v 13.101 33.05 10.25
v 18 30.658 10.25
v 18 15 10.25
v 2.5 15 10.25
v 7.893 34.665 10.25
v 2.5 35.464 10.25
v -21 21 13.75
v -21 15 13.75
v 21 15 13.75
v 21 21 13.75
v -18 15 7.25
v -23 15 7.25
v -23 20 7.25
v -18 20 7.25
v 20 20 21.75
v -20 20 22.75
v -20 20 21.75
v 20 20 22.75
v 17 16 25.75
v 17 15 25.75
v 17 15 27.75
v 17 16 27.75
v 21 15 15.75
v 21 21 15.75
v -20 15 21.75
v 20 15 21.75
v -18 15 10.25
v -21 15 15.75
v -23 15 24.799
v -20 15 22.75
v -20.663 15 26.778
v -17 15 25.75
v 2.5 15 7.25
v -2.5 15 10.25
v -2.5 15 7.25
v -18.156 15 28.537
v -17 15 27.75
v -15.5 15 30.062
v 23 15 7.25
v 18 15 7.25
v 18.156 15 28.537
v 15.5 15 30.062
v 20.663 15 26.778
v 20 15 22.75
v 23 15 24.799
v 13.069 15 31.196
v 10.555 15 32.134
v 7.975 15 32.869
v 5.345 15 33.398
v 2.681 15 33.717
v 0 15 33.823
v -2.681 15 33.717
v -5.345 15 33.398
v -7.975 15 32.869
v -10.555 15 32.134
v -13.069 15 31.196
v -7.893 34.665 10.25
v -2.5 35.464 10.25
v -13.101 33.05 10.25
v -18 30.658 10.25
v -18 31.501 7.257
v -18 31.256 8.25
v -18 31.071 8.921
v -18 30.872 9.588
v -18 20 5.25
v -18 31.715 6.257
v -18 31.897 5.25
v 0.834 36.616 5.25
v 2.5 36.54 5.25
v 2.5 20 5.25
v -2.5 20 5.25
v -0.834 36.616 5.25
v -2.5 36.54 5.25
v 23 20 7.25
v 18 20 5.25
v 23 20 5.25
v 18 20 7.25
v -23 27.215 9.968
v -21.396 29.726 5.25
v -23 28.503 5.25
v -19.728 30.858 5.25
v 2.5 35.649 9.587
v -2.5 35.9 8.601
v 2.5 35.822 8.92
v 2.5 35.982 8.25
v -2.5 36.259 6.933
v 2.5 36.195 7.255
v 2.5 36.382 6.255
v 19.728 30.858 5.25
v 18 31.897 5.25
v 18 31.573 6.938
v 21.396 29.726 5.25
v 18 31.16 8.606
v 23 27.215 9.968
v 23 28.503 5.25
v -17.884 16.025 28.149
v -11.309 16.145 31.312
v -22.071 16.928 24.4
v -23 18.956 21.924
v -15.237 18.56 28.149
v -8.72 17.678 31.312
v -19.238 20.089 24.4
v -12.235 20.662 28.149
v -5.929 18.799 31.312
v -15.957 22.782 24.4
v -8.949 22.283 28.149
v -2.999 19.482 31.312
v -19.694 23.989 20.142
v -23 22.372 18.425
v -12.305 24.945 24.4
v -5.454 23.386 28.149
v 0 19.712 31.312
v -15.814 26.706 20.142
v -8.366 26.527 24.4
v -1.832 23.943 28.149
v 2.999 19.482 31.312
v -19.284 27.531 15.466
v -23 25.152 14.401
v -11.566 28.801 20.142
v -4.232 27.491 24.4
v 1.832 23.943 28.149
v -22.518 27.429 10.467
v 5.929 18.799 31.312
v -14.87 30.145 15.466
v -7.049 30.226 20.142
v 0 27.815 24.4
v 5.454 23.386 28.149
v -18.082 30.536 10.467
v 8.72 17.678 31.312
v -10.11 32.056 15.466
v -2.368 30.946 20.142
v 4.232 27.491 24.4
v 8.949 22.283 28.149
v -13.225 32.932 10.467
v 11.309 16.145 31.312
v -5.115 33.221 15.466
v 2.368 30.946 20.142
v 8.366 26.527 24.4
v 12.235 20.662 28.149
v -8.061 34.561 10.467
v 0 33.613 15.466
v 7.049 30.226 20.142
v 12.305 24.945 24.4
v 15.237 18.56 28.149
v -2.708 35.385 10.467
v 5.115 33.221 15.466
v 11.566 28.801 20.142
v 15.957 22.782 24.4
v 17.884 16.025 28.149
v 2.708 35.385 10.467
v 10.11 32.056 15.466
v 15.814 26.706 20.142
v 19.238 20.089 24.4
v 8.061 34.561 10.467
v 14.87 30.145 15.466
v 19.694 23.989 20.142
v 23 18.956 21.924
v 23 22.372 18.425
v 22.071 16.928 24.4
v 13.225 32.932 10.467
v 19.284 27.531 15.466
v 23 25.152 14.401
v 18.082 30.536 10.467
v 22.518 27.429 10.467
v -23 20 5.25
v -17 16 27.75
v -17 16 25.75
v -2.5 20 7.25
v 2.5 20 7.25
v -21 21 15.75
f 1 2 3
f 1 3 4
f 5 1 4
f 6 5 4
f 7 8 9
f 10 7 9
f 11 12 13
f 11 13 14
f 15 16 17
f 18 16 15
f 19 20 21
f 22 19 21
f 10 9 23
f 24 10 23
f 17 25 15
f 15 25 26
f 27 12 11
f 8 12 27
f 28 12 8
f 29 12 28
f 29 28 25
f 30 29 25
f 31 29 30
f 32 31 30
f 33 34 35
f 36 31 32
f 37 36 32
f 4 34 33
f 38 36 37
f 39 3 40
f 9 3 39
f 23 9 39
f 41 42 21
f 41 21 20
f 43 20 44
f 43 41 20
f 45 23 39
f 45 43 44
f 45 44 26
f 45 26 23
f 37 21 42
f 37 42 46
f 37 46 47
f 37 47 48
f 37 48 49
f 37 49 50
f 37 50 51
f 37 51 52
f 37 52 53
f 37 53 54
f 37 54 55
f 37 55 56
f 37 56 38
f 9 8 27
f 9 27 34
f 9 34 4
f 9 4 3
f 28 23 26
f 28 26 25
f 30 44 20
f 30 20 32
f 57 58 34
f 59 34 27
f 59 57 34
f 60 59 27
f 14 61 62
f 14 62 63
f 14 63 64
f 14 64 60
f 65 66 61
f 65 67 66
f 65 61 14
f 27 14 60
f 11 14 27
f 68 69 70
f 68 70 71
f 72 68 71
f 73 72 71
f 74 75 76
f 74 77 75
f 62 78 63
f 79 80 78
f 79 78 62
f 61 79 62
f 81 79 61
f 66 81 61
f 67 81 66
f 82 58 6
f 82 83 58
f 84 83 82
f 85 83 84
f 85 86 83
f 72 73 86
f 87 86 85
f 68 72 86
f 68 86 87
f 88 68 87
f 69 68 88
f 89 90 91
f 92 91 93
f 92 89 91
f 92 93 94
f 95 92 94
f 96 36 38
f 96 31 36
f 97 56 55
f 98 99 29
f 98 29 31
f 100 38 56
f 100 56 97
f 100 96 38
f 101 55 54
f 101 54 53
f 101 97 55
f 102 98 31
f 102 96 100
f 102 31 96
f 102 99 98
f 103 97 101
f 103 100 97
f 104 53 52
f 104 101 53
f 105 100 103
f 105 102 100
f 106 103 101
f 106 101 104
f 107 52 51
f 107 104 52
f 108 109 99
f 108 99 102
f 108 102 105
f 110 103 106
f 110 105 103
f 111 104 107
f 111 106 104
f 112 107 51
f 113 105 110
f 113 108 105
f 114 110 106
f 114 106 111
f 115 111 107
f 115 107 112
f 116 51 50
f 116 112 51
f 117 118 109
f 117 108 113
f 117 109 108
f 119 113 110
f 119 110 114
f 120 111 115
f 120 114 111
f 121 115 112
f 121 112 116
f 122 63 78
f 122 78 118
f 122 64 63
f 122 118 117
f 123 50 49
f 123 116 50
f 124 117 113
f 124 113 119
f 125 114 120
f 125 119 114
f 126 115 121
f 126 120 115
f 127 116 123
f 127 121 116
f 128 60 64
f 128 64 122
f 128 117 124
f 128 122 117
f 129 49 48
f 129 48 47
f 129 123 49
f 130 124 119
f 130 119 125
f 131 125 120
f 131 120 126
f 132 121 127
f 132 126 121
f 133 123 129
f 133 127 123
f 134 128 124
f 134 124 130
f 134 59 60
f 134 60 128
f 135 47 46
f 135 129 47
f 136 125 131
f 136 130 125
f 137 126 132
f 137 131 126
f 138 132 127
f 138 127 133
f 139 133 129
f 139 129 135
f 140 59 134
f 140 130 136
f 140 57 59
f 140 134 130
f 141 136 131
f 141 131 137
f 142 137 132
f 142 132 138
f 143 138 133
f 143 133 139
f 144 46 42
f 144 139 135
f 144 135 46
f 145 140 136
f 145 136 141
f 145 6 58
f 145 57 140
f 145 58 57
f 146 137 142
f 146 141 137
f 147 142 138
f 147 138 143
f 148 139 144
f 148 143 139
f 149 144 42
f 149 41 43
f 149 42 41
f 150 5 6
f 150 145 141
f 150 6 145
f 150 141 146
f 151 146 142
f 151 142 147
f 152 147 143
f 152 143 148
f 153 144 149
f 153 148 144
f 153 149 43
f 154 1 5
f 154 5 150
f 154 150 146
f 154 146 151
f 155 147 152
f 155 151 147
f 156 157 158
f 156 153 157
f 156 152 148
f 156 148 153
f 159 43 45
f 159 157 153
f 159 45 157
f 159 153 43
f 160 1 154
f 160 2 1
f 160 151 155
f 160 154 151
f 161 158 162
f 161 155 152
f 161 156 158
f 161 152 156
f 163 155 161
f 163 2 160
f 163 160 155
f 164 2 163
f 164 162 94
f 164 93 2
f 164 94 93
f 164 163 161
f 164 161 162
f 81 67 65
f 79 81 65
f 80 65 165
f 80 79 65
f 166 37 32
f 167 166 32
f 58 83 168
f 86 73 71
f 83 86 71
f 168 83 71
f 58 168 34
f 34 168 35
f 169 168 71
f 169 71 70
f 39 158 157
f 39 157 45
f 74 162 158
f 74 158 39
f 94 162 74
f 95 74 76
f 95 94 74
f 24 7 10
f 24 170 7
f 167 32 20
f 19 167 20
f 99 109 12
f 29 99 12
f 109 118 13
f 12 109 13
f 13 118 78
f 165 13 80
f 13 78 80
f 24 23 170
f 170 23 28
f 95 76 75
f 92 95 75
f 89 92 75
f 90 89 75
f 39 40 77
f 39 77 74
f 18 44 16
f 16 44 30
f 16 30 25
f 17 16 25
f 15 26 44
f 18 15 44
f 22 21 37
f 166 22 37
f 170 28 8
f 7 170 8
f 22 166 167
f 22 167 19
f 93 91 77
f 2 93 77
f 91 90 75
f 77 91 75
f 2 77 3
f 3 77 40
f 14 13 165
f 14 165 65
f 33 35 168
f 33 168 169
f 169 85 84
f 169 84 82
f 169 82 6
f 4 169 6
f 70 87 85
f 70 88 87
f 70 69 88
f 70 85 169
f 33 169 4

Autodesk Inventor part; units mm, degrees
sketch "スケッチ1" plane through (0, 0, 0) normal (0, 1, 0) x (-1, 0, 0)
  circle A0 centre (0, 0) radius 37
  line L0 (0, 0) -> (0, -37)
  line L1 (0, 0) -> (0, 37)
  dimension "d0" = 74
revolve "回転1" add sketch "スケッチ1" angle 180 about axis through (0, 0, 0) along (0, 0, 1) picked at (-2.7444, -24.3574) contours L1 L0 A0
sketch "スケッチ5" plane through (0, 0, 0) normal (0, -1, 0) x (1, 0, 0)
  line L0 (-20, -25) -> (20, -25)
  line L1 (20, -25) -> (20, -15)
  line L2 (20, -15) -> (-20, -15)
  line L3 (-20, -15) -> (-20, -25)
  line L4 (-20, -17) -> (-20, -15)
  line L5 (0, 27.75) -> (-17, 27.75)
  line L6 (-17, 27.75) -> (-17, 25.75)
  line L7 (-17, 25.75) -> (0, 25.75)
  line L8 (0, 25.75) -> (0, 27.75)
  line L9 (0, 22.75) -> (-20, 22.75)
  line L10 (-20, 22.75) -> (-20, 21.75)
  line L11 (-20, 21.75) -> (0, 21.75)
  line L12 (0, 21.75) -> (0, 22.75)
  line L13 (0, 15.75) -> (-21, 15.75)
  line L14 (-21, 15.75) -> (-21, 13.75)
  line L15 (-21, 13.75) -> (0, 13.75)
  line L16 (0, 13.75) -> (0, 15.75)
  line L17 (0, 7.75) -> (-23, 7.75)
  line L18 (-23, 7.75) -> (-23, 5.25)
  line L19 (-23, 5.25) -> (0, 5.25)
  line L20 (0, 5.25) -> (0, 7.75)
  circle A0 centre (0, 0) radius 37 projected
  circle A1 centre (0, 0) radius 37 projected
  line L21 (0, 37) -> (0, -37)
  line L22 (37, 0) -> (-37, 0)
  line L23 (-32.5, 5.25) -> (-23, 5.25)
  line L24 (-23, 5.25) -> (-23, -5.25)
  line L25 (-23, -5.25) -> (-32.5, -5.25)
  line L26 (-32.5, -5.25) -> (-32.5, 5.25)
  line L27 (-23, -8.0262) -> (-23, 5.25)
  line L28 (-27, 25.2982) -> (-27, -25.2982)
  line L29 (-15.5, 27.75) -> (-12, 27.75)
  line L30 (-12, 27.75) -> (-12, 35)
  line L31 (-12, 35) -> (-15.5, 35)
  line L32 (-15.5, 35) -> (-15.5, 27.75)
  line L33 (-15.5, 25.75) -> (0, 25.75)
  line L34 (0, 25.75) -> (0, 22.75)
  line L35 (0, 22.75) -> (-15.5, 22.75)
  line L36 (-15.5, 22.75) -> (-15.5, 25.75)
  line L37 (-19, 15.75) -> (0, 15.75)
  line L38 (0, 15.75) -> (0, 21.75)
  line L39 (0, 21.75) -> (-19, 21.75)
  line L40 (-19, 21.75) -> (-19, 15.75)
  line L41 (-19, 13.75) -> (0, 13.75)
  line L42 (0, 13.75) -> (0, 7.75)
  line L43 (0, 7.75) -> (-19, 7.75)
  line L44 (-19, 7.75) -> (-19, 13.75)
  line L45 (-23, 0) -> (-40.624, 0)
  line L46 (-23, 0) -> (-8.7712, 0)
  line L47 (-9.875, 5.25) -> (-23, 5.25)
  line L48 (-23, 5.25) -> (-23, -5.25)
  line L49 (-23, -5.25) -> (-9.875, -5.25)
  line L50 (-9.875, 5.25) -> (-23, -5.25) construction
  line L51 (-23, 5.25) -> (-9.875, -5.25) construction
  line L52 (-23, 7.25) -> (-33.5, 7.25)
  line L53 (-33.5, 7.25) -> (-33.5, -7.25)
  line L54 (-33.5, -7.25) -> (-23, -7.25)
  line L55 (-23, -7.25) -> (-23, 7.25)
  line L56 (-23, 7.25) -> (-33.5, -7.25) construction
  line L57 (-33.5, 7.25) -> (-23, -7.25) construction
  line L58 (-6.125, 5.25) -> (0, 5.25)
  line L59 (0, 5.25) -> (0, -5.25)
  line L60 (0, -5.25) -> (-6.125, -5.25)
  line L61 (-6.125, 5.25) -> (0, -5.25) construction
  line L62 (0, 5.25) -> (-6.125, -5.25) construction
  line L63 (-23, 5.25) -> (-27, 5.25)
  line L64 (-23, -5.25) -> (-27, -5.25)
  line L65 (-23, 7.25) -> (-27, 7.25)
  line L66 (-23, -7.25) -> (-27, -7.25)
  line L67 (26.3249, -26) -> (-26.3249, -26)
  line L68 (-6.125, 5.25) -> (-6.8, 5.25)
  line L69 (-6.2297, -5.25) -> (-6.125, -5.25)
  line L70 (-6.125, -5.25) -> (-6.125, 5.25)
  line L71 (-3, 7.75) -> (0, 7.75)
  line L72 (0, 22.75) -> (-4, 22.75)
  line L73 (-4, 21.75) -> (0, 21.75)
  line L74 (0, 21.75) -> (0, 22.75)
  line L75 (-6, 7.75) -> (-1, 7.75)
  line L76 (0, 5.25) -> (-6, 5.25)
  point P0 (0, -25)
  point P1 (0, -15)
  point P2 (0, 26.75)
  point P3 (0, 22.25)
  point P4 (0, 14.75)
  point P5 (0, 6.5)
  point P6 (-20, -20)
  point P7 (-27, -0.5262)
  point P8 (-27, -5.25)
  point P9 (-15.5, 24.25)
  point P10 (-15.5, 33.5969)
  point P11 (0, 27.75)
  point P12 (0, 37)
  point P13 (0, 25.75)
  point P14 (0, 13.75)
  point P15 (0, 15.75)
  point P16 (-27, 0)
  point P17 (-32.5, 0)
  point P18 (-23, 0)
  point P19 (-16.4375, 0)
  point P20 (-28.25, 0)
  point P21 (-3.0625, 0)
  point P22 (-27, 0.5)
  point P23 (-28, 0.4738)
  point P24 (-28, -11.5262)
  point P25 (-27, -11.5)
  point P26 (-23, -5.25)
  point P27 (-23, 5.25)
  point P28 (-23, -5.25)
  point P29 (0, 0)
  point P30 (-8, 6)
  point P31 (-26.3249, -26)
  point P32 (-8, -6)
  point P33 (0, 21.75)
  point P34 (0, 22.75)
  point P35 (-27, -7.25)
  point P36 (-27, 7.25)
  point P37 (-19, 10.75)
  dimension "d12" = 40
  dimension "d13" = 10
  dimension "d23" = 17
  dimension "d24" = 2
  dimension "d27" = 20
  dimension "d28" = 1
  dimension "d30" = 21
  dimension "d31" = 2
  dimension "d33" = 2.5
  dimension "d88" = 0
  dimension "d89" = 0
  dimension "d90" = 12
  dimension "d92" = 20
  dimension "d97" = 9.5
  dimension "d98" = 10.5
  dimension "d113" = 27
  dimension "d122" = 15.5
  dimension "d124" = 3
  dimension "d125" = 15.5
  dimension "d126" = 6
  dimension "d127" = 6
  dimension "d147" = 10.5
  dimension "d161" = 14.5
  dimension "d162" = 10.5
  dimension "d164" = 10.5
  dimension "d170" = 26
  dimension "d207" = 0
  dimension "d283" = 2
  dimension "d284" = 2
  dimension "d297" = 23
extrude "GNSボード" cut sketch "スケッチ5" against normal blind 16 contours L8 L7 L6 L5
extrude "GNSボード止めるよう" cut sketch "スケッチ5" against normal blind 15 contours L21 L5 L30 A0 | L30 L5 L32 A0 | L21 L9 L36 L7
extrude "アルミ板１" cut sketch "スケッチ5" against normal blind 20 contours L12 L11 L10 L9
extrude "メイン基板" cut sketch "スケッチ5" against normal blind 21 contours L15 L14 L13 L16
extrude "メイン止めるよう" cut sketch "スケッチ5" against normal blind 14.5 contours L17 L44 L15 L21 | L13 L40 L11 L21
extrude "アルミ板２" cut sketch "スケッチ5" against normal blind 20 contours L19 L18 L17 L20
extrude "電池ボックス入れ" cut sketch "スケッチ5" against normal blind 13 contours L3 L2 L21 L0 | L21 L2 L1 L0
extrude "side ut" cut sketch "スケッチ5" against normal blind 100 contours A0 L22 L53 L54 L28 | A0 L28 L52 L53 L22 | L54 L53 L22 L26 L25 L28 | L53 L52 L28 L23 L26 L22 | L25 L26 L22 L28 | L26 L23 L28 L22
extrude "motor case" add sketch "スケッチ5" against normal blind 7 contours L54 L53 L22 L26 L25 L28 | L28 L25 L27 L54 | L53 L52 L28 L23 L26 L22 | L28 L22 L24 L25 | L25 L26 L22 L28 | L22 L28 L23 L24 | L52 L18 L23 L28 | L26 L23 L28 L22
extrude "bottom cut" cut sketch "スケッチ5" against normal blind 90 contours L67 A0 L21 | L21 A0 L67
extrude "motor" [suppressed]
extrude "motor block" [suppressed]
sketch "スケッチ27" plane through (-33.5, 0, -7.25) normal (-1, 0, 0) x (0, 0, 1)
  line L0 (14.5, 0) -> (0, 0) projected
  circle A0 centre (7.25, 0) radius 3
  point P0 (7.25, 0)
  dimension "d198" = 6
extrude "押し出し36" cut sketch "スケッチ27" against normal blind 27
mirror "ミラー13" about plane through (0, 0, 0) normal (1, 0, 0) of "メイン止めるよう", "メイン基板", "アルミ板１", "GNSボード止めるよう", "GNSボード", "アルミ板２", "motor case", "押し出し36", "電池ボックス入れ", "side ut"
ref_plane "作業平面5" through (-17, 17.5, 25.75) normal (0, -1, 0) x (1, 0, 0)
ref_plane "作業平面6" through (20, 13, -15) normal (0, 0, -1) x (1, 0, 0)
sketch "スケッチ38" plane through (20, 13, -15) normal (0, 0, -1) x (1, 0, 0)
  line L0 (-40, 13) -> (0, 13) projected
  line L1 (-40, 13) -> (-40, 0) projected
  line L2 (-40, 0) -> (0, 0) projected
  line L3 (0, 13) -> (0, 0) projected
  line L4 (-38, 6) -> (-28, 6)
  line L5 (-28, 6) -> (-28, -3)
  line L6 (-28, -3) -> (-38, -3)
  line L7 (-38, -3) -> (-38, 6)
  point P0 (-20, 13)
  dimension "d235" = 3
  dimension "d236" = 9
  dimension "d237" = 10
  dimension "d238" = 2
extrude "押し出し44" cut sketch "スケッチ38" against normal blind 18 contours L7 L4 L5 L2 | L2 L5 L6 L7
ref_plane "作業平面7" through (27, 35, 7.25) normal (0, -1, 0) x (1, 0, 0)
sketch "スケッチ41" plane through (-17, 0, 25.75) normal (0, -1, 0) x (1, 0, 0)
  line L0 (-16.5, -22.75) -> (10.5, -22.75) projected
  line L1 (-6, -20.5) -> (-6, -18) projected
  line L2 (-6, -18) -> (-2, -18) projected
  line L3 (-2, -18) -> (-2, -12) projected
  line L4 (-2, -12) -> (-4, -12) projected
  line L5 (-4, -12) -> (-4, -10) projected
  line L6 (-4, -10) -> (-2, -10) projected
  line L7 (-2, -10) -> (-2, -4) projected
  line L8 (-2, -4) -> (-3, -4) projected
  line L9 (-3, -4) -> (-3, -3) projected
  line L10 (-3, -3) -> (1.5, -3) projected
  line L11 (1.5, -3) -> (1.5, 0) projected
  line L12 (1.5, 0) -> (0, 0) projected
  line L13 (0, 0) -> (0, 2) projected
  line L14 (0, 2) -> (1.5, 2) projected
  line L15 (1.5, 2) -> (1.5, 7.8469) projected
  arc A0 (1.5, 7.8469) -> (-10, -0.4518) centre (17, -25.75) ccw projected
  line L16 (-10, -0.4518) -> (-10, -18.5) projected
  line L17 (-10, -18.5) -> (-16.5, -18.5) projected
  line L18 (-16.5, -18.5) -> (-16.5, -22.75) projected
  line L19 (-2, -18) -> (-2, -12) projected
  line L20 (-4, -10) -> (-4, -12) projected
  line L21 (0, 2) -> (0, 0) projected
  circle A1 centre (-4, 0) radius 2
  line L22 (50.5, -28.75) -> (23.5, -28.75) projected
  line L23 (23.5, -28.75) -> (23.5, -22.75) projected
  line L24 (23.5, -22.75) -> (50.5, -22.75) projected
  line L25 (50.5, -18.5) -> (50.5, -22.75) projected
  line L26 (44, -18.5) -> (50.5, -18.5) projected
  line L27 (44, -18.5) -> (44, -0.4518) projected
  arc A2 (44, -0.4518) -> (32.5, 7.8469) centre (17, -25.75) ccw projected
  line L28 (32.5, 7.8469) -> (32.5, 2) projected
  line L29 (32.5, 2) -> (34, 2) projected
  line L30 (34, 2) -> (34, 0) projected
  line L31 (34, 0) -> (32.5, 0) projected
  line L32 (32.5, 0) -> (32.5, -3) projected
  line L33 (32.5, -3) -> (37, -3) projected
  line L34 (37, -3) -> (37, -4) projected
  line L35 (37, -4) -> (36, -4) projected
  line L36 (36, -4) -> (36, -10) projected
  line L37 (36, -10) -> (38, -10) projected
  line L38 (38, -10) -> (38, -12) projected
  line L39 (38, -12) -> (36, -12) projected
  line L40 (36, -12) -> (36, -18) projected
  line L41 (36, -18) -> (40, -18) projected
  line L42 (40, -18) -> (40, -20.5) projected
  line L43 (40, -20.5) -> (-6, -20.5) projected
  line L44 (10.5, -22.75) -> (10.5, -28.75) projected
  line L45 (10.5, -28.75) -> (-16.5, -28.75) projected
  line L46 (-16.5, -28.75) -> (-16.5, -33) projected
  line L47 (-16.5, -33) -> (-10, -33) projected
  line L48 (-10, -33) -> (-10, -51.0482) projected
  arc A3 (-10, -51.0482) -> (-9.3249, -51.75) centre (17, -25.75) ccw projected
  line L49 (-9.3249, -51.75) -> (43.3249, -51.75) projected
  arc A4 (43.3249, -51.75) -> (44, -51.0482) centre (17, -25.75) ccw projected
  line L50 (44, -51.0482) -> (44, -33) projected
  line L51 (50.5, -33) -> (44, -33) projected
  line L52 (50.5, -28.75) -> (50.5, -33) projected
  dimension "d252" = 4
  dimension "d253" = 4
  dimension "d254" = 3
extrude "押し出し46" cut sketch "スケッチ41" against normal blind 10 contours A1
mirror "ミラー15" about plane through (0, 0, 0) normal (1, 0, 0) of "押し出し46"
sketch "スケッチ42" plane through (-33.5, 0, -7.25) normal (0, -1, 0) x (1, 0, 0)
  circle A0 centre (10, -8) radius 2
  line L0 (13.5, -17.75) -> (13.5, -7.75) projected
  line L1 (10, 2) -> (1, 2) projected
  point P0 (33.5, 7.25)
  dimension "d257" = 3.5
  dimension "d258" = 4
  dimension "d259" = 10
extrude "押し出し47" cut sketch "スケッチ42" against normal blind 10
mirror "ミラー16" about plane through (0, 0, 0) normal (1, 0, 0) of "押し出し47"
ref_plane "作業平面8" through (-17, 15, 25.75) normal (0, -1, 0) x (1, 0, 0)
sketch "スケッチ45" plane through (-17, 15, 25.75) normal (0, -1, 0) x (1, 0, 0)
  circle A0 centre (-4, 0) radius 2 projected
  line L0 (-16.5, -22.75) -> (10.5, -22.75) projected
  line L1 (-6, -20.5) -> (-6, -18) projected
  line L2 (-6, -18) -> (-2, -18) projected
  line L3 (-2, -18) -> (-2, -12) projected
  line L4 (-2, -12) -> (-4, -12) projected
  line L5 (-4, -12) -> (-4, -10) projected
  line L6 (-4, -10) -> (-2, -10) projected
  line L7 (-2, -10) -> (-2, -4) projected
  line L8 (-2, -4) -> (-3, -4) projected
  line L9 (-3, -4) -> (-3, -3) projected
  line L10 (-3, -3) -> (1.5, -3) projected
  line L11 (1.5, -3) -> (1.5, 0) projected
  line L12 (1.5, 0) -> (0, 0) projected
  line L13 (0, 0) -> (0, 2) projected
  line L14 (0, 2) -> (1.5, 2) projected
  line L15 (1.5, 2) -> (1.5, 7.8469) projected
  arc A1 (1.5, 7.8469) -> (-10, -0.4518) centre (17, -25.75) ccw projected
  line L16 (-10, -0.4518) -> (-10, -18.5) projected
  line L17 (-10, -18.5) -> (-16.5, -18.5) projected
  line L18 (-16.5, -18.5) -> (-16.5, -22.75) projected
  arc A2 (32.5, 4.3124) -> (1.5, 4.3124) centre (17, -25.75) ccw projected
  line L19 (1.5, 2) -> (1.5, 4.3124) projected
  line L20 (32.5, 2) -> (1.5, 2) projected
  line L21 (32.5, 2) -> (32.5, 4.3124) projected
  circle A3 centre (38, 0) radius 2 projected
  circle A4 centre (38, 0) radius 2 projected
  line L22 (23.5, -22.75) -> (50.5, -22.75) projected
  line L23 (50.5, -18.5) -> (50.5, -22.75) projected
  line L24 (44, -18.5) -> (50.5, -18.5) projected
  line L25 (44, -18.5) -> (44, -0.4518) projected
  arc A5 (44, -0.4518) -> (32.5, 7.8469) centre (17, -25.75) ccw projected
  line L26 (32.5, 7.8469) -> (32.5, 2) projected
  line L27 (32.5, 2) -> (34, 2) projected
  line L28 (34, 2) -> (34, 0) projected
  line L29 (34, 0) -> (32.5, 0) projected
  line L30 (32.5, 0) -> (32.5, -3) projected
  line L31 (32.5, -3) -> (37, -3) projected
  line L32 (37, -3) -> (37, -4) projected
  line L33 (37, -4) -> (36, -4) projected
  line L34 (36, -4) -> (36, -10) projected
  line L35 (36, -10) -> (38, -10) projected
  line L36 (38, -10) -> (38, -12) projected
  line L37 (38, -12) -> (36, -12) projected
  line L38 (36, -12) -> (36, -18) projected
  line L39 (36, -18) -> (40, -18) projected
  line L40 (40, -18) -> (40, -20.5) projected
  circle A6 centre (-4, 0) radius 2 projected
  line L41 (1.5, 0) -> (32.5, 0) projected
  line L42 (32.5, -3) -> (1.5, -3) projected
  line L43 (32.5, -3) -> (32.5, 0) projected
  line L44 (1.5, 0) -> (32.5, 0) projected
  line L45 (1.5, -3) -> (1.5, 0) projected
  line L46 (34, 0) -> (0, 0) projected
  line L47 (34, 0) -> (34, 2) projected
  line L48 (34, 2) -> (0, 2) projected
  line L49 (0, 0) -> (0, 2) projected
  line L50 (36, -10) -> (-2, -10) projected
  line L51 (36, -10) -> (36, -4) projected
  line L52 (-2, -4) -> (36, -4) projected
  line L53 (-2, -10) -> (-2, -4) projected
  line L54 (38, -12) -> (-4, -12) projected
  line L55 (38, -12) -> (38, -10) projected
  line L56 (38, -10) -> (-4, -10) projected
  line L57 (-4, -12) -> (-4, -10) projected
  line L58 (36, -18) -> (-2, -18) projected
  line L59 (36, -18) -> (36, -12) projected
  line L60 (-2, -12) -> (36, -12) projected
  line L61 (-2, -18) -> (-2, -12) projected
  line L62 (40, -20.5) -> (-6, -20.5) projected
  line L63 (40, -20.5) -> (40, -18) projected
  line L64 (40, -18) -> (-6, -18) projected
  line L65 (-6, -20.5) -> (-6, -18) projected
  circle A7 centre (40.5, -41) radius 2 projected
  circle A8 centre (-6.5, -41) radius 2 projected
  line L66 (50.5, -28.75) -> (23.5, -28.75) projected
  line L67 (40, -20.5) -> (-6, -20.5) projected
  line L68 (10.5, -28.75) -> (-16.5, -28.75) projected
  line L69 (-6, -20.5) -> (-6, -18) projected
  line L70 (-16.5, -28.75) -> (-16.5, -33) projected
  line L71 (-16.5, -33) -> (-10, -33) projected
  line L72 (-10, -33) -> (-10, -51.0482) projected
  arc A9 (-10, -51.0482) -> (-9.3249, -51.75) centre (17, -25.75) ccw projected
  line L73 (-9.3249, -51.75) -> (43.3249, -51.75) projected
  arc A10 (43.3249, -51.75) -> (44, -51.0482) centre (17, -25.75) ccw projected
  line L74 (44, -51.0482) -> (44, -33) projected
  line L75 (50.5, -33) -> (44, -33) projected
  line L76 (50.5, -28.75) -> (50.5, -33) projected
  line L77 (40, -18) -> (40, -20.5) projected
  line L78 (-3, -40.75) -> (37, -40.75) projected
  line L79 (37, -40.75) -> (37, -50.75) projected
  line L80 (37, -50.75) -> (-3, -50.75) projected
  line L81 (-3, -50.75) -> (-3, -40.75) projected
  line L82 (-6, -18) -> (40, -18)
  line L83 (40, -18) -> (40, 8.0731)
  line L84 (40, 8.0731) -> (-6, 8.0731)
  line L85 (-6, 8.0731) -> (-6, -18)
  arc A11 (32.5, 4.3124) -> (1.5, 4.3124) centre (17, -25.75) ccw projected
  line L86 (32.5, 4.3124) -> (32.5, 7.8469) projected
  arc A12 (44, -0.4518) -> (32.5, 7.8469) centre (17, -25.75) ccw projected
  line L87 (44, -0.4518) -> (44, -51.0482) projected
  arc A13 (43.3249, -51.75) -> (44, -51.0482) centre (17, -25.75) ccw projected
  line L88 (43.3249, -51.75) -> (-9.3249, -51.75) projected
  arc A14 (-10, -51.0482) -> (-9.3249, -51.75) centre (17, -25.75) ccw projected
  line L89 (-10, -51.0482) -> (-10, -0.4518) projected
  arc A15 (1.5, 7.8469) -> (-10, -0.4518) centre (17, -25.75) ccw projected
  line L90 (1.5, 7.8469) -> (1.5, 4.3124) projected
  line L91 (9, -32) -> (9, -20) projected
  line L92 (-6, -20) -> (9, -20) projected
  line L93 (-6, -21) -> (-6, -20) projected
  line L94 (-15, -21) -> (-6, -21) projected
  line L95 (-15, -31) -> (-15, -21) projected
  line L96 (-6, -31) -> (-15, -31) projected
  line L97 (-6, -32) -> (-6, -31) projected
  line L98 (9, -32) -> (-6, -32) projected
  line L99 (50.5, -28.75) -> (23.5, -28.75) projected
  line L100 (50.5, -22.75) -> (50.5, -28.75) projected
  line L101 (23.5, -22.75) -> (50.5, -22.75) projected
  line L102 (-16.5, -22.75) -> (10.5, -22.75) projected
  line L103 (-16.5, -28.75) -> (-16.5, -22.75) projected
  line L104 (10.5, -28.75) -> (-16.5, -28.75) projected
  line L105 (10.5, -28.75) -> (10.5, -22.75) projected
  line L106 (23.5, -28.75) -> (23.5, -22.75) projected
  line L107 (50.5, -28.75) -> (23.5, -28.75) projected
  line L108 (23.5, -28.75) -> (23.5, -22.75) projected
  line L109 (40, -20.5) -> (-6, -20.5) projected
  line L110 (-6, -20.5) -> (-6, -18) projected
  line L111 (-6, -18) -> (-2, -18) projected
  line L112 (-2, -18) -> (-2, -12) projected
  line L113 (-2, -12) -> (-4, -12) projected
  line L114 (-4, -12) -> (-4, -10) projected
  line L115 (-4, -10) -> (-2, -10) projected
  line L116 (-2, -10) -> (-2, -4) projected
  line L117 (-2, -4) -> (-3, -4) projected
  line L118 (-3, -4) -> (-3, -3) projected
  line L119 (-3, -3) -> (1.5, -3) projected
  line L120 (1.5, -3) -> (1.5, 0) projected
  line L121 (1.5, 0) -> (0, 0) projected
  line L122 (0, 0) -> (0, 2) projected
  line L123 (0, 2) -> (1.5, 2) projected
  line L124 (1.5, 2) -> (1.5, 7.8469) projected
  arc A16 (1.5, 7.8469) -> (-10, -0.4518) centre (17, -25.75) ccw projected
  line L125 (-10, -0.4518) -> (-10, -18.5) projected
  line L126 (-10, -18.5) -> (-16.5, -18.5) projected
  line L127 (-16.5, -18.5) -> (-16.5, -22.75) projected
  line L128 (-16.5, -22.75) -> (10.5, -22.75) projected
  line L129 (10.5, -22.75) -> (10.5, -28.75) projected
  line L130 (10.5, -28.75) -> (-16.5, -28.75) projected
  line L131 (-16.5, -28.75) -> (-16.5, -33) projected
  line L132 (-16.5, -33) -> (-10, -33) projected
  line L133 (-10, -33) -> (-10, -51.0482) projected
  arc A17 (-10, -51.0482) -> (-9.3249, -51.75) centre (17, -25.75) ccw projected
  line L134 (-9.3249, -51.75) -> (43.3249, -51.75) projected
  arc A18 (43.3249, -51.75) -> (44, -51.0482) centre (17, -25.75) ccw projected
  line L135 (44, -51.0482) -> (44, -33) projected
  line L136 (50.5, -33) -> (44, -33) projected
  line L137 (50.5, -28.75) -> (50.5, -33) projected
  line L138 (50.5, -28.75) -> (23.5, -28.75) projected
  line L139 (23.5, -28.75) -> (23.5, -22.75) projected
  line L140 (23.5, -22.75) -> (50.5, -22.75) projected
  line L141 (50.5, -18.5) -> (50.5, -22.75) projected
  line L142 (44, -18.5) -> (50.5, -18.5) projected
  line L143 (44, -18.5) -> (44, -0.4518) projected
  arc A19 (44, -0.4518) -> (32.5, 7.8469) centre (17, -25.75) ccw projected
  line L144 (32.5, 7.8469) -> (32.5, 2) projected
  line L145 (32.5, 2) -> (34, 2) projected
  line L146 (34, 2) -> (34, 0) projected
  line L147 (34, 0) -> (32.5, 0) projected
  line L148 (32.5, 0) -> (32.5, -3) projected
  line L149 (32.5, -3) -> (37, -3) projected
  line L150 (37, -3) -> (37, -4) projected
  line L151 (37, -4) -> (36, -4) projected
  line L152 (36, -4) -> (36, -10) projected
  line L153 (36, -10) -> (38, -10) projected
  line L154 (38, -10) -> (38, -12) projected
  line L155 (38, -12) -> (36, -12) projected
  line L156 (36, -12) -> (36, -18) projected
  line L157 (36, -18) -> (40, -18) projected
  line L158 (40, -18) -> (40, -20.5) projected
  line L159 (40, -20.5) -> (-6, -20.5) projected
  line L160 (10.5, -22.75) -> (10.5, -28.75) projected
  line L161 (10.5, -28.75) -> (-16.5, -28.75) projected
  line L162 (-16.5, -28.75) -> (-16.5, -33) projected
  line L163 (-16.5, -33) -> (-10, -33) projected
  line L164 (-10, -33) -> (-10, -51.0482) projected
  arc A20 (-10, -51.0482) -> (-9.3249, -51.75) centre (17, -25.75) ccw projected
  line L165 (-9.3249, -51.75) -> (43.3249, -51.75) projected
  arc A21 (43.3249, -51.75) -> (44, -51.0482) centre (17, -25.75) ccw projected
  line L166 (44, -51.0482) -> (44, -33) projected
  line L167 (50.5, -33) -> (44, -33) projected
  line L168 (50.5, -28.75) -> (50.5, -33) projected
  line L169 (23.5, -28.75) -> (23.5, -22.75) projected
  line L170 (23.5, -22.75) -> (50.5, -22.75) projected
  line L171 (50.5, -18.5) -> (50.5, -22.75) projected
  line L172 (44, -18.5) -> (50.5, -18.5) projected
  line L173 (44, -18.5) -> (44, -0.4518) projected
  arc A22 (44, -0.4518) -> (32.5, 7.8469) centre (17, -25.75) ccw projected
  line L174 (32.5, 7.8469) -> (32.5, 2) projected
  line L175 (32.5, 2) -> (34, 2) projected
  line L176 (34, 2) -> (34, 0) projected
  line L177 (34, 0) -> (32.5, 0) projected
  line L178 (32.5, 0) -> (32.5, -3) projected
  line L179 (32.5, -3) -> (37, -3) projected
  line L180 (37, -3) -> (37, -4) projected
  line L181 (37, -4) -> (36, -4) projected
  line L182 (36, -4) -> (36, -10) projected
  line L183 (36, -10) -> (38, -10) projected
  line L184 (38, -10) -> (38, -12) projected
  line L185 (38, -12) -> (36, -12) projected
  line L186 (36, -12) -> (36, -18) projected
  line L187 (36, -18) -> (40, -18) projected
  line L188 (-6, -18) -> (-2, -18) projected
  line L189 (-2, -18) -> (-2, -12) projected
  line L190 (-2, -12) -> (-4, -12) projected
  line L191 (-4, -12) -> (-4, -10) projected
  line L192 (-4, -10) -> (-2, -10) projected
  line L193 (-2, -10) -> (-2, -4) projected
  line L194 (-2, -4) -> (-3, -4) projected
  line L195 (-3, -4) -> (-3, -3) projected
  line L196 (-3, -3) -> (1.5, -3) projected
  line L197 (1.5, -3) -> (1.5, 0) projected
  line L198 (1.5, 0) -> (0, 0) projected
  line L199 (0, 0) -> (0, 2) projected
  line L200 (0, 2) -> (1.5, 2) projected
  line L201 (1.5, 2) -> (1.5, 7.8469) projected
  arc A23 (1.5, 7.8469) -> (-10, -0.4518) centre (17, -25.75) ccw projected
  line L202 (-10, -0.4518) -> (-10, -18.5) projected
  line L203 (-10, -18.5) -> (-16.5, -18.5) projected
  line L204 (-16.5, -18.5) -> (-16.5, -22.75) projected
  line L205 (-16.5, -22.75) -> (10.5, -22.75) projected
  line L206 (10.5, -22.75) -> (10.5, -28.75) projected
  point P0 (-10, -33)
  point P1 (44, -33)
  point P2 (44, -18.5)
  point P3 (40, 3.2328)
  point P4 (40, -18)
  point P5 (-6, -20.5)
  point P6 (-6, -18)
  point P7 (-6, 3.2328)
  point P8 (-10, -33)
  point P9 (44, -33)
  point P10 (44, -18.5)
  point P11 (-10, -18.5)
  point P12 (44, -22.75)
  point P13 (-10, -22.75)
  point P14 (-10, -18.5)
  point P15 (44, -28.75)
  point P16 (-10, -28.75)
  point P17 (32.5, 4.3124)
  point P18 (1.5, 4.3124)
  point P19 (1.5, 4.3124)
  point P20 (32.5, 4.3124)
  point P21 (-10, -22.75)
  point P22 (-10, -28.75)
  point P23 (32.5, 4.3124)
  point P24 (1.5, 4.3124)
  point P25 (44, -22.75)
  point P26 (44, -28.75)
  point P27 (-10, -18.5)
  point P28 (50.5, -28.75)
  point P29 (44, -33)
  point P30 (1.5, 4.3124)
  point P31 (32.5, 4.3124)
  point P32 (50.5, -28.75)
  point P33 (44, -28.75)
  point P34 (44, -22.75)
  point P35 (32.5, 4.3124)
  point P36 (1.5, 4.3124)
  point P37 (44, -33)
  point P38 (-10, -22.75)
  point P39 (-10, -28.75)
  point P40 (1.5, 4.3124)
  point P41 (32.5, 4.3124)
  point P42 (-16.5, -28.75)
  point P43 (-16.5, -28.75)
extrude "side and front cut" cut sketch "スケッチ45" along normal mid plane 100 contours L85 L1 L93 L94 L89 L16 A1 | L89 L94 L95 L0 L18 L17 | L62 L91 L0 L89 L94 L93 | L89 L0 L95 L94 | L62 L40 L83 A5 L25 L87 L22 L106 L66 L74 A10 L73 A9 L72 L89 L96 L97 L98 L91 L68 L105 L0 | L0 L95 L68 L103 | L89 L68 L95 L0 | L0 L91 L68 L89 | L0 L105 L68 L91 | L68 L95 L96 L89 L71 L70 | L89 L96 L95 L68 | L68 L91 L98 L97 L96 L89 | L24 L23 L22 L87 | L87 L66 L106 L22 | L22 L100 L66 L87 | L66 L76 L75 L87 | A7 | A8 | L78 L79 L80 L81
sketch "スケッチ46" plane through (-17, 15, 25.75) normal (0, -1, 0) x (1, 0, 0)
  line L0 (-6, 0) -> (-6, -18) projected
  line L1 (-6, -18) -> (-2, -18) projected
  line L2 (-2, -18) -> (-2, -12) projected
  line L3 (-2, -12) -> (-4, -12) projected
  line L4 (-4, -12) -> (-4, -10) projected
  line L5 (-4, -10) -> (-2, -10) projected
  line L6 (-2, -10) -> (-2, -4) projected
  line L7 (-2, -4) -> (-3, -4) projected
  line L8 (-3, -4) -> (-3, -3) projected
  line L9 (-3, -3) -> (1.5, -3) projected
  line L10 (1.5, -3) -> (1.5, 0) projected
  line L11 (1.5, 0) -> (0, 0) projected
  line L12 (0, 0) -> (0, 2) projected
  line L13 (0, 2) -> (1.5, 2) projected
  line L14 (1.5, 2) -> (1.5, 7.8469) projected
  arc A0 (1.5, 7.8469) -> (-6, 3.2328) centre (17, -25.75) ccw projected
  line L15 (-6, 3.2328) -> (-6, 0) projected
  circle A1 centre (-4, 0) radius 2 projected
  circle A2 centre (-4, 0) radius 2 projected
  line L16 (40, -18) -> (40, 0) projected
  circle A3 centre (38, 0) radius 2 projected
  line L17 (40, 0) -> (40, 3.2328) projected
  arc A4 (40, 3.2328) -> (32.5, 7.8469) centre (17, -25.75) ccw projected
  line L18 (32.5, 7.8469) -> (32.5, 2) projected
  line L19 (32.5, 2) -> (34, 2) projected
  line L20 (34, 2) -> (34, 0) projected
  line L21 (34, 0) -> (32.5, 0) projected
  line L22 (32.5, 0) -> (32.5, -3) projected
  line L23 (32.5, -3) -> (37, -3) projected
  line L24 (37, -3) -> (37, -4) projected
  line L25 (37, -4) -> (36, -4) projected
  line L26 (36, -4) -> (36, -10) projected
  line L27 (36, -10) -> (38, -10) projected
  line L28 (38, -10) -> (38, -12) projected
  line L29 (38, -12) -> (36, -12) projected
  line L30 (36, -12) -> (36, -18) projected
  line L31 (36, -18) -> (40, -18) projected
  arc A5 (32.5, 4.3124) -> (1.5, 4.3124) centre (17, -25.75) ccw projected
  line L32 (1.5, 2) -> (1.5, 4.3124) projected
  line L33 (32.5, 2) -> (1.5, 2) projected
  line L34 (32.5, 2) -> (32.5, 4.3124) projected
  line L35 (34, 0) -> (0, 0) projected
  line L36 (34, 0) -> (34, 2) projected
  line L37 (34, 2) -> (0, 2) projected
  line L38 (0, 0) -> (0, 2) projected
  line L39 (32.5, -3) -> (1.5, -3) projected
  line L40 (32.5, -3) -> (32.5, 0) projected
  line L41 (1.5, 0) -> (32.5, 0) projected
  line L42 (1.5, -3) -> (1.5, 0) projected
  line L43 (36, -10) -> (-2, -10) projected
  line L44 (36, -10) -> (36, -4) projected
  line L45 (-2, -4) -> (36, -4) projected
  line L46 (-2, -10) -> (-2, -4) projected
  line L47 (36, -18) -> (-2, -18) projected
  line L48 (36, -18) -> (36, -12) projected
  line L49 (-2, -12) -> (36, -12) projected
  line L50 (-2, -18) -> (-2, -12) projected
  point P0 (1.5, 4.3124)
  point P1 (-2, -18)
  point P2 (36, -18)
extrude "front cut 2" cut sketch "スケッチ46" along normal blind 100 contours L15 A0 L14 L13 L12 L11 L10 L9 L8 L7 L6 L5 L4 L3 L2 L1 L0 | A1 | L2 L49 L30 L47 | L3 L4 L5 L43 L27 L28 L29 L49 | A3 | L30 L29 L28 L27 L26 L25 L24 L23 L22 L21 L20 L19 L18 A4 L17 L16 L31 | A5 L18 L33 L14 | L33 L19 L20 L21 L35 L11 L12 L13 | L6 L45 L26 L43 | L7 L8 L9 L39 L23 L24 L25 L45 | L35 L22 L39 L10
sketch "スケッチ48" plane through (0, 0, 5.25) normal (0, 0, -1) x (-1, 0, 0)
  line L0 (-23, 20) -> (23, 20) projected
  line L1 (23, 28.5033) -> (23, 20) projected
  arc A0 (23, 28.5033) -> (-23, 28.5033) centre (0, 0) ccw projected
  line L2 (-23, 28.5033) -> (-23, 20) projected
  line L3 (-23, 15) -> (23, 15) projected
  line L4 (-23, 15) -> (-23, 20) projected
  line L5 (23, 15) -> (23, 20) projected
  line L6 (-23, 40) -> (-18, 40)
  line L7 (-18, 40) -> (-18, 15)
  line L8 (-18, 15) -> (-23, 15)
  line L9 (-23, 15) -> (-23, 40)
  line L10 (18, 40) -> (23, 40)
  line L11 (23, 40) -> (23, 15)
  line L12 (23, 15) -> (18, 15)
  line L13 (18, 15) -> (18, 40)
  line L14 (-2.5, 36.6256) -> (2.5, 36.6256)
  line L15 (2.5, 36.6256) -> (2.5, 20)
  line L16 (2.5, 20) -> (-2.5, 20)
  line L17 (-2.5, 20) -> (-2.5, 36.6256)
  line L18 (0, 0) -> (0, 36.6256)
  point P0 (18, 20)
  point P1 (18, 31.8973)
  point P2 (-18, 31.8973)
  point P3 (-18, 20)
  point P4 (2.5, 36.5402)
  point P5 (2.5, 20)
  point P6 (-2.5, 36.5402)
  dimension "d274" = 25
  dimension "d275" = 5
  dimension "d276" = 25
  dimension "d277" = 5
  dimension "d280" = 5
  dimension "d282" = 2.5
extrude "lock cut" cut sketch "スケッチ48" against normal blind 3 contours L7 A0 L17 L0 | L15 A0 L13 L0
sketch "スケッチ49" plane through (23, 15, 7.75) normal (0, 0, -1) x (-1, 0, 0)
  line L0 (46, 0) -> (0, 0) projected
  line L1 (46, -15) -> (46, 5) projected
  line L2 (0, 0) -> (46, 0)
  line L3 (46, 0) -> (46, 5)
  line L4 (46, 5) -> (0, 5)
  line L5 (0, 5) -> (0, 0)
  point P0 (23, -15)
  point P1 (38.5, 0)
  point P2 (7.5, 0)
extrude "押し出し52" cut sketch "スケッチ49" against normal up to surface (0.5 mm away)
sketch "スケッチ50" plane through (0, 0, 5.25) normal (0, 0, -1) x (-1, 0, 0)
  point P0 (0, 0)
sketch "スケッチ51" plane through (0, 0, 8.25) normal (0, 0, -1) x (-1, 0, 0)
  line L0 (-23, 15) -> (-23, 28.5033) projected
  line L1 (18, 20) -> (23, 20) projected
  line L2 (-23, 15) -> (23, 15)
  line L3 (23, 15) -> (23, 20)
  line L4 (23, 20) -> (-23, 20)
  line L5 (-23, 20) -> (-23, 15)
  arc A0 (18, 31.256) -> (2.5, 35.9818) centre (0, 0) ccw projected
  line L6 (2.5, 20) -> (2.5, 35.9818) projected
  line L7 (-2.5, 35.9818) -> (-2.5, 20) projected
  arc A1 (-2.5, 35.9818) -> (-18, 31.256) centre (0, 0) ccw projected
  line L8 (-18, 20) -> (-18, 31.256) projected
  line L9 (18, 31.256) -> (18, 20) projected
  line L10 (-2.5, 20) -> (-18, 20) projected
  line L11 (18, 20) -> (2.5, 20) projected
  point P0 (2.5, 20)
  point P1 (-2.5, 20)
extrude "押し出し53" cut sketch "スケッチ51" against normal blind 2
sketch "スケッチ52" plane through (0, 0, 10.25) normal (0, 0, -1) x (-1, 0, 0)
  line L0 (-23, 20) -> (-18, 20) projected
  line L1 (-23, 20) -> (-18, 20) projected
  line L2 (-2.5, 20) -> (2.5, 20) projected
  line L3 (-2.5, 20) -> (2.5, 20) projected
  point P0 (0, 0)
sketch "スケッチ53" plane through (0, 15, 0) normal (0, -1, 0) x (1, 0, 0)
  line L0 (18, 10.25) -> (18, 5.25) projected
  line L1 (23, 5.25) -> (18, 5.25) projected
  line L2 (23, 10.25) -> (23, 5.25) projected
  line L3 (23, 10.25) -> (18, 10.25) projected
  line L4 (-2.5, 10.25) -> (-2.5, 5.25) projected
  line L5 (2.5, 5.25) -> (-2.5, 5.25) projected
  line L6 (2.5, 5.25) -> (2.5, 10.25) projected
  line L7 (2.5, 10.25) -> (-2.5, 10.25) projected
  line L8 (-18, 5.25) -> (-18, 10.25) projected
  line L9 (-18, 10.25) -> (-23, 10.25) projected
  line L10 (-23, 5.25) -> (-23, 10.25) projected
  line L11 (-18, 5.25) -> (-23, 5.25) projected
  point P0 (0, 0)
extrude "押し出し54" add sketch "スケッチ53" against normal up to surface (5 mm away)
sketch "スケッチ54" plane through (0, 15, 0) normal (0, -1, 0) x (1, 0, 0)
  line L0 (-18, 10.25) -> (-2.5, 10.25) projected
  line L1 (23, 24.7992) -> (23, 5.25) projected
  line L2 (23, 5.25) -> (-23, 5.25)
  line L3 (-23, 5.25) -> (-23, 7.25)
  line L4 (-23, 7.25) -> (23, 7.25)
  line L5 (23, 7.25) -> (23, 5.25)
  line L6 (18, 5.25) -> (23, 5.25) projected
  point P0 (0, 0)
  point P1 (23, 5.25)
  point P2 (23, 7.25)
  dimension "d295" = 2
  dimension "d296" = 46
extrude "押し出し55" cut sketch "スケッチ54" against normal blind 5
properties part number "body back for main printing" material "ABS プラスチック"
